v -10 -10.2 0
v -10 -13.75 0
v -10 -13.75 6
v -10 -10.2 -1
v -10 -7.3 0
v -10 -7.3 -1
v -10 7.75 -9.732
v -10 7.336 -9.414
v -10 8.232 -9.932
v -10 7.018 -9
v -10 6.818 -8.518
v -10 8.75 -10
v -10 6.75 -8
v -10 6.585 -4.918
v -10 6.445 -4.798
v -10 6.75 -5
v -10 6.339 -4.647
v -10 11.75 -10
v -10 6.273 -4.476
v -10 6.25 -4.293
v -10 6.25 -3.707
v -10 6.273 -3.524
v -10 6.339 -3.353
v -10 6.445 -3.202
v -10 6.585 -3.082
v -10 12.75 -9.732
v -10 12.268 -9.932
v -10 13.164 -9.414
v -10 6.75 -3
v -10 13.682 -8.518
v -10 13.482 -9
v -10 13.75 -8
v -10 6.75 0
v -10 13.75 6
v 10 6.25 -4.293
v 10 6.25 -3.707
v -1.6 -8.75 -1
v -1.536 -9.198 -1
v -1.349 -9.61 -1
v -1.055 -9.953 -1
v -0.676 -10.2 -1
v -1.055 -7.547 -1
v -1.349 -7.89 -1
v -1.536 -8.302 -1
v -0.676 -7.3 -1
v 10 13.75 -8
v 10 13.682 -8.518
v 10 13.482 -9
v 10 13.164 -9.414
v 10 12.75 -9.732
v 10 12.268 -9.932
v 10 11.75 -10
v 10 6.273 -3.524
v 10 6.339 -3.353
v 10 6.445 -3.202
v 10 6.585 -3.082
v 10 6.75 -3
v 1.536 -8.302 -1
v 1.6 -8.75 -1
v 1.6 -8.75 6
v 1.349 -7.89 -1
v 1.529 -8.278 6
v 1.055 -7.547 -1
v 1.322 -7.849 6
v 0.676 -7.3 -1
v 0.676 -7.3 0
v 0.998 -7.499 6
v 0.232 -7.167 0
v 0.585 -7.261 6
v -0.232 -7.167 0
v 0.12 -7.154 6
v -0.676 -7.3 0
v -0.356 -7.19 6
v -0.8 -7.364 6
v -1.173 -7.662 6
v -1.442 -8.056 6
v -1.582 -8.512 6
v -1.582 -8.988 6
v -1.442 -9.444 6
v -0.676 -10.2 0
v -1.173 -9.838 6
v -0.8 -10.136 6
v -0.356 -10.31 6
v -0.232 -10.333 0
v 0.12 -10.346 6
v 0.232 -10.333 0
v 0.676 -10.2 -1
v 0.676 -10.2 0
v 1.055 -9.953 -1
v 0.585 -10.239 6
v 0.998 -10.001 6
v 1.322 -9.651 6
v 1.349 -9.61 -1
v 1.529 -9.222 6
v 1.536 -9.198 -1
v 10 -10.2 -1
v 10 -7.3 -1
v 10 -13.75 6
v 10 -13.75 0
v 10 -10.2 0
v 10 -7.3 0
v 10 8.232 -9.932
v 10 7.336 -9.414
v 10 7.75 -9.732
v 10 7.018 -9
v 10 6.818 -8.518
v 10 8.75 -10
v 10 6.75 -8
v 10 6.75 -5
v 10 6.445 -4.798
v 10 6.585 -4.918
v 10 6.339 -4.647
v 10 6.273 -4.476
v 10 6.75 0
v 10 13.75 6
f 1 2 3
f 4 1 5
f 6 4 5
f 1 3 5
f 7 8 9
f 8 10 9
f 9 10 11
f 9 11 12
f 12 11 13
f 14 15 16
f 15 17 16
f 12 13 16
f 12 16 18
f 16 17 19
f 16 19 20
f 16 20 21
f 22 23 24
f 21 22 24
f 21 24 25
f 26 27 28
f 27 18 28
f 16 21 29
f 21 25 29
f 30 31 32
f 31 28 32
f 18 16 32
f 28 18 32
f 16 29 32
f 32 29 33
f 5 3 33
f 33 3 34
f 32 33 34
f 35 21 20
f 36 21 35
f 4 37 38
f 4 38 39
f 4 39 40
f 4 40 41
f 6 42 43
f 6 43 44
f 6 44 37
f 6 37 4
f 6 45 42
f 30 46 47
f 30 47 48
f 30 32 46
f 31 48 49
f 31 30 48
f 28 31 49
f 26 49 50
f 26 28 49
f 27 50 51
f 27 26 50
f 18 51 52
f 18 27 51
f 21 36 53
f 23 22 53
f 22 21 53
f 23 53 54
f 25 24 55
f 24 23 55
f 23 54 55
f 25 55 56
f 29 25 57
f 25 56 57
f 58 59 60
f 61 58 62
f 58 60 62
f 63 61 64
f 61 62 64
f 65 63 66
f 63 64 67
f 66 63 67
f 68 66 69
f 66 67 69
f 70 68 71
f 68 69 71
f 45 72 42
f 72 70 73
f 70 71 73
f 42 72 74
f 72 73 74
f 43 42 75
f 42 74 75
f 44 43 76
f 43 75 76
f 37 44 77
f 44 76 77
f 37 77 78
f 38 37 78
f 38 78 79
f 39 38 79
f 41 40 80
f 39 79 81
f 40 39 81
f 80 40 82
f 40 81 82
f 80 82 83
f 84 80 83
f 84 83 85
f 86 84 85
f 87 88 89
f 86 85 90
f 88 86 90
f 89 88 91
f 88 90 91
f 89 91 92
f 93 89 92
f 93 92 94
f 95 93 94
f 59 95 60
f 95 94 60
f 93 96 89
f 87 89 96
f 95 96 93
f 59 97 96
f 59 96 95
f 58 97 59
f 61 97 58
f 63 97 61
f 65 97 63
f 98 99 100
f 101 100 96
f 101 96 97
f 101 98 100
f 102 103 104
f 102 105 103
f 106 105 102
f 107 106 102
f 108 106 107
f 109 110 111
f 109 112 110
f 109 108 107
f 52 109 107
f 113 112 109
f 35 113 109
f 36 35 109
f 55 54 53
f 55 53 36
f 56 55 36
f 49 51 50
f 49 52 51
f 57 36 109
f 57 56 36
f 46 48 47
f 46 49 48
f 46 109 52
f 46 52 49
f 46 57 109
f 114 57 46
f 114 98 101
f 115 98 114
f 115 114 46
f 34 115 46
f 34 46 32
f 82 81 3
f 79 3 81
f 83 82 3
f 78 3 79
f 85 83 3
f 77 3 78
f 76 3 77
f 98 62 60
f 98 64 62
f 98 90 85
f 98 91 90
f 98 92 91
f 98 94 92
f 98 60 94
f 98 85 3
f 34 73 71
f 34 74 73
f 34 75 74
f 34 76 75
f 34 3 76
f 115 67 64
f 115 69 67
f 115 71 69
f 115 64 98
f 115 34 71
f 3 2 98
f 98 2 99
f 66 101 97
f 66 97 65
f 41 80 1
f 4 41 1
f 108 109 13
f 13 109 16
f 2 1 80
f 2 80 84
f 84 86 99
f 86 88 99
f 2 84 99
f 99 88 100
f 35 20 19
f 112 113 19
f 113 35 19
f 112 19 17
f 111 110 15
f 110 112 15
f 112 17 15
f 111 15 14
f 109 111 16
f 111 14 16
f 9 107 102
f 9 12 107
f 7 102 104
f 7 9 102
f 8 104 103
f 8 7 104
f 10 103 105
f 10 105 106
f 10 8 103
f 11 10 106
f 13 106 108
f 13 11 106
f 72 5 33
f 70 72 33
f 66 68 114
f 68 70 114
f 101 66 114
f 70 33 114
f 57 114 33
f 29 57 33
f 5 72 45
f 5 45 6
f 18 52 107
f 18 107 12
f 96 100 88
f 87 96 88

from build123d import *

# Parameters (mm, degrees)
ESQUISSE1_W             = 20
ESQUISSE1_H             = 27.5
BOSS_EXTRU_1_DEPTH      = 6
ESQUISSE2_W             = 20
ESQUISSE2_H             = 7
BOSS_EXTRU_2_DEPTH      = 10
CONG_2_R                = 2
ESQUISSE3_W             = 20
ESQUISSE3_H             = 2.9
BOSS_EXTRU_3_DEPTH      = 1
ESQUISSE4_R             = 1.6
ENL_V_MAT_EXTRU_1_DEPTH = 24.346573624
ESQUISSE6_W             = 20
ESQUISSE6_H             = 2
BOSS_EXTRU_5_DEPTH      = 0.5
CONG_4_R                = 0.75


with BuildPart() as part:
    # Esquisse1 → Boss.-Extru.1 (new body)
    with BuildSketch(Plane.XY):
        Rectangle(ESQUISSE1_W, ESQUISSE1_H)
    extrude(amount=BOSS_EXTRU_1_DEPTH)

    # Esquisse2 → Boss.-Extru.2 (add)
    with BuildSketch(Plane(origin=(0, 0, 0), x_dir=(-1, 0, 0), z_dir=(0, 0, -1))):
        with Locations((0, 10.25)):
            Rectangle(ESQUISSE2_W, ESQUISSE2_H)
    extrude(amount=BOSS_EXTRU_2_DEPTH)

    # Congé2
    cong_2_edges = [part.edges().sort_by_distance(p)[0] for p in [
        (0, 6.75, -10),
        (0, 13.75, -10),
    ]]
    fillet(cong_2_edges, radius=CONG_2_R)

    # Esquisse3 → Boss.-Extru.3 (add)
    with BuildSketch(Plane(origin=(0, 0, 0), x_dir=(-1, 0, 0), z_dir=(0, 0, -1))):
        with Locations((0, -8.75)):
            Rectangle(ESQUISSE3_W, ESQUISSE3_H)
    extrude(amount=BOSS_EXTRU_3_DEPTH)

    # Esquisse4 → Enlèv. mat.-Extru.1 (cut, through all)
    with BuildSketch(Plane.XY.offset(6)):
        with Locations((0, -8.75)):
            Circle(ESQUISSE4_R)
    extrude(amount=-ENL_V_MAT_EXTRU_1_DEPTH, mode=Mode.SUBTRACT)

    # Esquisse6 → Boss.-Extru.5 (add)
    with BuildSketch(Plane.XZ.offset(-6.75)):
        with Locations((0, -4)):
            Rectangle(ESQUISSE6_W, ESQUISSE6_H)
    extrude(amount=BOSS_EXTRU_5_DEPTH)

    # Congé4
    # the kernel refuses this fillet: 0.75 mm, written as the material it takes off along each edge
    with BuildSketch(Plane(origin=(-11.767766953, 6.25, -5), x_dir=(0, 1, 0), z_dir=(1, 0, 0)), Plane(origin=(11.767766953, 6.25, -3), x_dir=(0, 1, 0), z_dir=(-1, 0, 0))) as cong_4_piece_1:
        with BuildLine():
            CenterArc((0.75, 0.707106781), CONG_4_R, 180, 70.528779366)
            Line((0, 0.707106781), (-0.015, 0.707106781))
            Line((-0.015, 0.707106781), (-0.015, 0))
            Line((-0.015, 0), (0, -0.015))
            ThreePointArc((0, -0.015), (0.25, -0.015), (0.495, -0.014142136))
            Line((0.495, -0.014142136), (0.5, 0))
        make_face()
    extrude(amount=23.535533906, mode=Mode.SUBTRACT)


solid = part.part
